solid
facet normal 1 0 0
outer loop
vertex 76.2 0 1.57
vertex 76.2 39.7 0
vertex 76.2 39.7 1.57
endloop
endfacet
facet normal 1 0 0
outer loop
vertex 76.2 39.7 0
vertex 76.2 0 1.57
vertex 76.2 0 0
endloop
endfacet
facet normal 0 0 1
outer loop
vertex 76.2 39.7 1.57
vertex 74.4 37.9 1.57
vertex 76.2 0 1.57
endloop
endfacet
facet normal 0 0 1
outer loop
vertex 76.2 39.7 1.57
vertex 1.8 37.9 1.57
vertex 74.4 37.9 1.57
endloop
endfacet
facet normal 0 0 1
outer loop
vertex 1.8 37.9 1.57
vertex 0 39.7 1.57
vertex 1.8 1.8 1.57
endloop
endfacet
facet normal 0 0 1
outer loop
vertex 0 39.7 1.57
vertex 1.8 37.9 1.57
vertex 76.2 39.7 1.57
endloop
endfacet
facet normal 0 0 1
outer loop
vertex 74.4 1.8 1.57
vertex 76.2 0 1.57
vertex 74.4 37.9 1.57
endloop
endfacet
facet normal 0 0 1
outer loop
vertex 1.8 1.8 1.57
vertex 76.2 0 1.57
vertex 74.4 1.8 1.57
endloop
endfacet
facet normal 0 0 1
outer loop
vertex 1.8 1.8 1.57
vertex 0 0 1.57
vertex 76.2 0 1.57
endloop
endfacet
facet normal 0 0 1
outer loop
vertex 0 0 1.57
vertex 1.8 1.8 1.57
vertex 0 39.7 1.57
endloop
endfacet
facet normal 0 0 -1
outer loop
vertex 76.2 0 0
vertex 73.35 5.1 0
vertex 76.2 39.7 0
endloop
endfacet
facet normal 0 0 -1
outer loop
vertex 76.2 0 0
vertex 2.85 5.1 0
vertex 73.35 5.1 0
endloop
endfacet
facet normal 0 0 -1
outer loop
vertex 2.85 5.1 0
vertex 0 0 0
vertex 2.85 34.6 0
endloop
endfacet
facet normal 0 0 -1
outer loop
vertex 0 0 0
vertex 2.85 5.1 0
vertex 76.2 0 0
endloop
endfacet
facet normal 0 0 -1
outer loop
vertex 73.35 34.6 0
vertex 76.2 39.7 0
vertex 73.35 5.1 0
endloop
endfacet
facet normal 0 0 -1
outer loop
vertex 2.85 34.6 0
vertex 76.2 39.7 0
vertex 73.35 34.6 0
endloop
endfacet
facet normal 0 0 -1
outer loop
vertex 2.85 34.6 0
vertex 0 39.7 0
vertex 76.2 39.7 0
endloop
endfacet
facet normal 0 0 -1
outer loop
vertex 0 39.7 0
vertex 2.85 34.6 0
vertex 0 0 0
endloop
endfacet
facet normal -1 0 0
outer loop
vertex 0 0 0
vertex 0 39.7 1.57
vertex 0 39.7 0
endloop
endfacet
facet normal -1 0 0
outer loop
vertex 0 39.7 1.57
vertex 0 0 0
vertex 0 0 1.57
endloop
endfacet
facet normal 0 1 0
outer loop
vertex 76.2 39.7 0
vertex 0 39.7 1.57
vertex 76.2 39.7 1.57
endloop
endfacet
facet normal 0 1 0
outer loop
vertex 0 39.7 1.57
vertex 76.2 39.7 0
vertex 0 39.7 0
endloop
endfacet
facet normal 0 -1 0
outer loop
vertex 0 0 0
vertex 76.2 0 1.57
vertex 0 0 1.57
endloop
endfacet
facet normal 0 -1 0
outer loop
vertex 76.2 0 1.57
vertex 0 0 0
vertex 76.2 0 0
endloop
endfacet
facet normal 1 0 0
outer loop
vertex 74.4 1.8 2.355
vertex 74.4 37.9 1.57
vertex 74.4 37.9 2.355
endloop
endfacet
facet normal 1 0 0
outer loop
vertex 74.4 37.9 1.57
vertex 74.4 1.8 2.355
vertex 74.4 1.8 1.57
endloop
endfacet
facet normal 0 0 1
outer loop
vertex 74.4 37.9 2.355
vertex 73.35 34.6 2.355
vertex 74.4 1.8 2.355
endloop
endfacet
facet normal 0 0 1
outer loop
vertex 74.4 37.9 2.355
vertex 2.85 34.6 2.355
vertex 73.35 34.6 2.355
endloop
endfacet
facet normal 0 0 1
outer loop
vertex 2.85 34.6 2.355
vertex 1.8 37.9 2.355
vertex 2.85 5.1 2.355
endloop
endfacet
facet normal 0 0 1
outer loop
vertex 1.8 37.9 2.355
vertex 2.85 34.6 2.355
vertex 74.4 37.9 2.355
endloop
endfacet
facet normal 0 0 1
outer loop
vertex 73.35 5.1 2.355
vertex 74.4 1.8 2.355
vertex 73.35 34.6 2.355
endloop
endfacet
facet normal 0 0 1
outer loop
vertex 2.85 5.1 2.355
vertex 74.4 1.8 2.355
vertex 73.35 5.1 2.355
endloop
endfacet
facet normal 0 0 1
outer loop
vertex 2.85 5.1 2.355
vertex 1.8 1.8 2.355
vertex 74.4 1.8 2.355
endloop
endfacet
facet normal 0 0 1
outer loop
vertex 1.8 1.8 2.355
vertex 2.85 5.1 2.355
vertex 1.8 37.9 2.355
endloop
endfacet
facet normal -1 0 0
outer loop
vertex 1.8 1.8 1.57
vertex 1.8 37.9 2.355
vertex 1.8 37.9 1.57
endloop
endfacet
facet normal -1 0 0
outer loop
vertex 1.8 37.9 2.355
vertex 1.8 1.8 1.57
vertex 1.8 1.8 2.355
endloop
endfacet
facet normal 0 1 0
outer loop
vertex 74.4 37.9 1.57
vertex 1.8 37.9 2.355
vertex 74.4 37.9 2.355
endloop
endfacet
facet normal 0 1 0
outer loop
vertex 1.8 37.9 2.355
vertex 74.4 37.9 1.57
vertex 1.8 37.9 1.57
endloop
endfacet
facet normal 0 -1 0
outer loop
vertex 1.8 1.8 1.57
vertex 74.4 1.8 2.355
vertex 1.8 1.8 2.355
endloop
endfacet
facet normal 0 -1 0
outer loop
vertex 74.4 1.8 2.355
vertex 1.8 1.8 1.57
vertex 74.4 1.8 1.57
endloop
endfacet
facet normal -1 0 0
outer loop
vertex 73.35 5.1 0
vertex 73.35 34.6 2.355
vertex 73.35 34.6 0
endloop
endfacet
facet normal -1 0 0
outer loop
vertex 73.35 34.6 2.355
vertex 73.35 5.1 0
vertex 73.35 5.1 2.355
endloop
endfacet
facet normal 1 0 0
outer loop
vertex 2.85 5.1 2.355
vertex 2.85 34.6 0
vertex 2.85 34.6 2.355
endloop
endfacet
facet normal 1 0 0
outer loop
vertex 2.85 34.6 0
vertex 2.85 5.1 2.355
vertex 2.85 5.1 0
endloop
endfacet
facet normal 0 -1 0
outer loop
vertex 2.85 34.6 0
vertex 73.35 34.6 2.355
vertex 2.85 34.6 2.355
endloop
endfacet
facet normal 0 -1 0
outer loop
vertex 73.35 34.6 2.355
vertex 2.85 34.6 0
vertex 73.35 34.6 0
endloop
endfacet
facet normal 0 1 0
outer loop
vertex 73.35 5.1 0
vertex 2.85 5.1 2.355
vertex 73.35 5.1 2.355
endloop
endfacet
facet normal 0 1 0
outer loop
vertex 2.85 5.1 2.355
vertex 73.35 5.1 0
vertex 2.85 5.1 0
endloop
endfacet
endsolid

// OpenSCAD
// file: panel.scad
// entire panel
panel_ht =  39.7;
panel_wd =  76.2;
panel_th = 1.57;
panel_clearance = 2;    // around edges

// edge offset of extra thickness
edge_offset = 3;

module plate() {
    cube([panel_wd, panel_ht, panel_th]);
}
    
module inner_plate() {
	translate([edge_offset, edge_offset, panel_th])
		cube([panel_wd-edge_offset*2, panel_ht-edge_offset*2, panel_th/2]);
}
// main file
include <panel.scad>

// override
edge_offset = 1.8;

cutout_wd = 70.5;
cutout_ht = 29.5;


module front_panel() {
	difference() {
		union() {
			plate(); 
			inner_plate();
		}
		translate([(panel_wd - cutout_wd)/2, (panel_ht - cutout_ht)/2, -20])
			cube([cutout_wd, cutout_ht, 100]);
	}
}

front_panel();
